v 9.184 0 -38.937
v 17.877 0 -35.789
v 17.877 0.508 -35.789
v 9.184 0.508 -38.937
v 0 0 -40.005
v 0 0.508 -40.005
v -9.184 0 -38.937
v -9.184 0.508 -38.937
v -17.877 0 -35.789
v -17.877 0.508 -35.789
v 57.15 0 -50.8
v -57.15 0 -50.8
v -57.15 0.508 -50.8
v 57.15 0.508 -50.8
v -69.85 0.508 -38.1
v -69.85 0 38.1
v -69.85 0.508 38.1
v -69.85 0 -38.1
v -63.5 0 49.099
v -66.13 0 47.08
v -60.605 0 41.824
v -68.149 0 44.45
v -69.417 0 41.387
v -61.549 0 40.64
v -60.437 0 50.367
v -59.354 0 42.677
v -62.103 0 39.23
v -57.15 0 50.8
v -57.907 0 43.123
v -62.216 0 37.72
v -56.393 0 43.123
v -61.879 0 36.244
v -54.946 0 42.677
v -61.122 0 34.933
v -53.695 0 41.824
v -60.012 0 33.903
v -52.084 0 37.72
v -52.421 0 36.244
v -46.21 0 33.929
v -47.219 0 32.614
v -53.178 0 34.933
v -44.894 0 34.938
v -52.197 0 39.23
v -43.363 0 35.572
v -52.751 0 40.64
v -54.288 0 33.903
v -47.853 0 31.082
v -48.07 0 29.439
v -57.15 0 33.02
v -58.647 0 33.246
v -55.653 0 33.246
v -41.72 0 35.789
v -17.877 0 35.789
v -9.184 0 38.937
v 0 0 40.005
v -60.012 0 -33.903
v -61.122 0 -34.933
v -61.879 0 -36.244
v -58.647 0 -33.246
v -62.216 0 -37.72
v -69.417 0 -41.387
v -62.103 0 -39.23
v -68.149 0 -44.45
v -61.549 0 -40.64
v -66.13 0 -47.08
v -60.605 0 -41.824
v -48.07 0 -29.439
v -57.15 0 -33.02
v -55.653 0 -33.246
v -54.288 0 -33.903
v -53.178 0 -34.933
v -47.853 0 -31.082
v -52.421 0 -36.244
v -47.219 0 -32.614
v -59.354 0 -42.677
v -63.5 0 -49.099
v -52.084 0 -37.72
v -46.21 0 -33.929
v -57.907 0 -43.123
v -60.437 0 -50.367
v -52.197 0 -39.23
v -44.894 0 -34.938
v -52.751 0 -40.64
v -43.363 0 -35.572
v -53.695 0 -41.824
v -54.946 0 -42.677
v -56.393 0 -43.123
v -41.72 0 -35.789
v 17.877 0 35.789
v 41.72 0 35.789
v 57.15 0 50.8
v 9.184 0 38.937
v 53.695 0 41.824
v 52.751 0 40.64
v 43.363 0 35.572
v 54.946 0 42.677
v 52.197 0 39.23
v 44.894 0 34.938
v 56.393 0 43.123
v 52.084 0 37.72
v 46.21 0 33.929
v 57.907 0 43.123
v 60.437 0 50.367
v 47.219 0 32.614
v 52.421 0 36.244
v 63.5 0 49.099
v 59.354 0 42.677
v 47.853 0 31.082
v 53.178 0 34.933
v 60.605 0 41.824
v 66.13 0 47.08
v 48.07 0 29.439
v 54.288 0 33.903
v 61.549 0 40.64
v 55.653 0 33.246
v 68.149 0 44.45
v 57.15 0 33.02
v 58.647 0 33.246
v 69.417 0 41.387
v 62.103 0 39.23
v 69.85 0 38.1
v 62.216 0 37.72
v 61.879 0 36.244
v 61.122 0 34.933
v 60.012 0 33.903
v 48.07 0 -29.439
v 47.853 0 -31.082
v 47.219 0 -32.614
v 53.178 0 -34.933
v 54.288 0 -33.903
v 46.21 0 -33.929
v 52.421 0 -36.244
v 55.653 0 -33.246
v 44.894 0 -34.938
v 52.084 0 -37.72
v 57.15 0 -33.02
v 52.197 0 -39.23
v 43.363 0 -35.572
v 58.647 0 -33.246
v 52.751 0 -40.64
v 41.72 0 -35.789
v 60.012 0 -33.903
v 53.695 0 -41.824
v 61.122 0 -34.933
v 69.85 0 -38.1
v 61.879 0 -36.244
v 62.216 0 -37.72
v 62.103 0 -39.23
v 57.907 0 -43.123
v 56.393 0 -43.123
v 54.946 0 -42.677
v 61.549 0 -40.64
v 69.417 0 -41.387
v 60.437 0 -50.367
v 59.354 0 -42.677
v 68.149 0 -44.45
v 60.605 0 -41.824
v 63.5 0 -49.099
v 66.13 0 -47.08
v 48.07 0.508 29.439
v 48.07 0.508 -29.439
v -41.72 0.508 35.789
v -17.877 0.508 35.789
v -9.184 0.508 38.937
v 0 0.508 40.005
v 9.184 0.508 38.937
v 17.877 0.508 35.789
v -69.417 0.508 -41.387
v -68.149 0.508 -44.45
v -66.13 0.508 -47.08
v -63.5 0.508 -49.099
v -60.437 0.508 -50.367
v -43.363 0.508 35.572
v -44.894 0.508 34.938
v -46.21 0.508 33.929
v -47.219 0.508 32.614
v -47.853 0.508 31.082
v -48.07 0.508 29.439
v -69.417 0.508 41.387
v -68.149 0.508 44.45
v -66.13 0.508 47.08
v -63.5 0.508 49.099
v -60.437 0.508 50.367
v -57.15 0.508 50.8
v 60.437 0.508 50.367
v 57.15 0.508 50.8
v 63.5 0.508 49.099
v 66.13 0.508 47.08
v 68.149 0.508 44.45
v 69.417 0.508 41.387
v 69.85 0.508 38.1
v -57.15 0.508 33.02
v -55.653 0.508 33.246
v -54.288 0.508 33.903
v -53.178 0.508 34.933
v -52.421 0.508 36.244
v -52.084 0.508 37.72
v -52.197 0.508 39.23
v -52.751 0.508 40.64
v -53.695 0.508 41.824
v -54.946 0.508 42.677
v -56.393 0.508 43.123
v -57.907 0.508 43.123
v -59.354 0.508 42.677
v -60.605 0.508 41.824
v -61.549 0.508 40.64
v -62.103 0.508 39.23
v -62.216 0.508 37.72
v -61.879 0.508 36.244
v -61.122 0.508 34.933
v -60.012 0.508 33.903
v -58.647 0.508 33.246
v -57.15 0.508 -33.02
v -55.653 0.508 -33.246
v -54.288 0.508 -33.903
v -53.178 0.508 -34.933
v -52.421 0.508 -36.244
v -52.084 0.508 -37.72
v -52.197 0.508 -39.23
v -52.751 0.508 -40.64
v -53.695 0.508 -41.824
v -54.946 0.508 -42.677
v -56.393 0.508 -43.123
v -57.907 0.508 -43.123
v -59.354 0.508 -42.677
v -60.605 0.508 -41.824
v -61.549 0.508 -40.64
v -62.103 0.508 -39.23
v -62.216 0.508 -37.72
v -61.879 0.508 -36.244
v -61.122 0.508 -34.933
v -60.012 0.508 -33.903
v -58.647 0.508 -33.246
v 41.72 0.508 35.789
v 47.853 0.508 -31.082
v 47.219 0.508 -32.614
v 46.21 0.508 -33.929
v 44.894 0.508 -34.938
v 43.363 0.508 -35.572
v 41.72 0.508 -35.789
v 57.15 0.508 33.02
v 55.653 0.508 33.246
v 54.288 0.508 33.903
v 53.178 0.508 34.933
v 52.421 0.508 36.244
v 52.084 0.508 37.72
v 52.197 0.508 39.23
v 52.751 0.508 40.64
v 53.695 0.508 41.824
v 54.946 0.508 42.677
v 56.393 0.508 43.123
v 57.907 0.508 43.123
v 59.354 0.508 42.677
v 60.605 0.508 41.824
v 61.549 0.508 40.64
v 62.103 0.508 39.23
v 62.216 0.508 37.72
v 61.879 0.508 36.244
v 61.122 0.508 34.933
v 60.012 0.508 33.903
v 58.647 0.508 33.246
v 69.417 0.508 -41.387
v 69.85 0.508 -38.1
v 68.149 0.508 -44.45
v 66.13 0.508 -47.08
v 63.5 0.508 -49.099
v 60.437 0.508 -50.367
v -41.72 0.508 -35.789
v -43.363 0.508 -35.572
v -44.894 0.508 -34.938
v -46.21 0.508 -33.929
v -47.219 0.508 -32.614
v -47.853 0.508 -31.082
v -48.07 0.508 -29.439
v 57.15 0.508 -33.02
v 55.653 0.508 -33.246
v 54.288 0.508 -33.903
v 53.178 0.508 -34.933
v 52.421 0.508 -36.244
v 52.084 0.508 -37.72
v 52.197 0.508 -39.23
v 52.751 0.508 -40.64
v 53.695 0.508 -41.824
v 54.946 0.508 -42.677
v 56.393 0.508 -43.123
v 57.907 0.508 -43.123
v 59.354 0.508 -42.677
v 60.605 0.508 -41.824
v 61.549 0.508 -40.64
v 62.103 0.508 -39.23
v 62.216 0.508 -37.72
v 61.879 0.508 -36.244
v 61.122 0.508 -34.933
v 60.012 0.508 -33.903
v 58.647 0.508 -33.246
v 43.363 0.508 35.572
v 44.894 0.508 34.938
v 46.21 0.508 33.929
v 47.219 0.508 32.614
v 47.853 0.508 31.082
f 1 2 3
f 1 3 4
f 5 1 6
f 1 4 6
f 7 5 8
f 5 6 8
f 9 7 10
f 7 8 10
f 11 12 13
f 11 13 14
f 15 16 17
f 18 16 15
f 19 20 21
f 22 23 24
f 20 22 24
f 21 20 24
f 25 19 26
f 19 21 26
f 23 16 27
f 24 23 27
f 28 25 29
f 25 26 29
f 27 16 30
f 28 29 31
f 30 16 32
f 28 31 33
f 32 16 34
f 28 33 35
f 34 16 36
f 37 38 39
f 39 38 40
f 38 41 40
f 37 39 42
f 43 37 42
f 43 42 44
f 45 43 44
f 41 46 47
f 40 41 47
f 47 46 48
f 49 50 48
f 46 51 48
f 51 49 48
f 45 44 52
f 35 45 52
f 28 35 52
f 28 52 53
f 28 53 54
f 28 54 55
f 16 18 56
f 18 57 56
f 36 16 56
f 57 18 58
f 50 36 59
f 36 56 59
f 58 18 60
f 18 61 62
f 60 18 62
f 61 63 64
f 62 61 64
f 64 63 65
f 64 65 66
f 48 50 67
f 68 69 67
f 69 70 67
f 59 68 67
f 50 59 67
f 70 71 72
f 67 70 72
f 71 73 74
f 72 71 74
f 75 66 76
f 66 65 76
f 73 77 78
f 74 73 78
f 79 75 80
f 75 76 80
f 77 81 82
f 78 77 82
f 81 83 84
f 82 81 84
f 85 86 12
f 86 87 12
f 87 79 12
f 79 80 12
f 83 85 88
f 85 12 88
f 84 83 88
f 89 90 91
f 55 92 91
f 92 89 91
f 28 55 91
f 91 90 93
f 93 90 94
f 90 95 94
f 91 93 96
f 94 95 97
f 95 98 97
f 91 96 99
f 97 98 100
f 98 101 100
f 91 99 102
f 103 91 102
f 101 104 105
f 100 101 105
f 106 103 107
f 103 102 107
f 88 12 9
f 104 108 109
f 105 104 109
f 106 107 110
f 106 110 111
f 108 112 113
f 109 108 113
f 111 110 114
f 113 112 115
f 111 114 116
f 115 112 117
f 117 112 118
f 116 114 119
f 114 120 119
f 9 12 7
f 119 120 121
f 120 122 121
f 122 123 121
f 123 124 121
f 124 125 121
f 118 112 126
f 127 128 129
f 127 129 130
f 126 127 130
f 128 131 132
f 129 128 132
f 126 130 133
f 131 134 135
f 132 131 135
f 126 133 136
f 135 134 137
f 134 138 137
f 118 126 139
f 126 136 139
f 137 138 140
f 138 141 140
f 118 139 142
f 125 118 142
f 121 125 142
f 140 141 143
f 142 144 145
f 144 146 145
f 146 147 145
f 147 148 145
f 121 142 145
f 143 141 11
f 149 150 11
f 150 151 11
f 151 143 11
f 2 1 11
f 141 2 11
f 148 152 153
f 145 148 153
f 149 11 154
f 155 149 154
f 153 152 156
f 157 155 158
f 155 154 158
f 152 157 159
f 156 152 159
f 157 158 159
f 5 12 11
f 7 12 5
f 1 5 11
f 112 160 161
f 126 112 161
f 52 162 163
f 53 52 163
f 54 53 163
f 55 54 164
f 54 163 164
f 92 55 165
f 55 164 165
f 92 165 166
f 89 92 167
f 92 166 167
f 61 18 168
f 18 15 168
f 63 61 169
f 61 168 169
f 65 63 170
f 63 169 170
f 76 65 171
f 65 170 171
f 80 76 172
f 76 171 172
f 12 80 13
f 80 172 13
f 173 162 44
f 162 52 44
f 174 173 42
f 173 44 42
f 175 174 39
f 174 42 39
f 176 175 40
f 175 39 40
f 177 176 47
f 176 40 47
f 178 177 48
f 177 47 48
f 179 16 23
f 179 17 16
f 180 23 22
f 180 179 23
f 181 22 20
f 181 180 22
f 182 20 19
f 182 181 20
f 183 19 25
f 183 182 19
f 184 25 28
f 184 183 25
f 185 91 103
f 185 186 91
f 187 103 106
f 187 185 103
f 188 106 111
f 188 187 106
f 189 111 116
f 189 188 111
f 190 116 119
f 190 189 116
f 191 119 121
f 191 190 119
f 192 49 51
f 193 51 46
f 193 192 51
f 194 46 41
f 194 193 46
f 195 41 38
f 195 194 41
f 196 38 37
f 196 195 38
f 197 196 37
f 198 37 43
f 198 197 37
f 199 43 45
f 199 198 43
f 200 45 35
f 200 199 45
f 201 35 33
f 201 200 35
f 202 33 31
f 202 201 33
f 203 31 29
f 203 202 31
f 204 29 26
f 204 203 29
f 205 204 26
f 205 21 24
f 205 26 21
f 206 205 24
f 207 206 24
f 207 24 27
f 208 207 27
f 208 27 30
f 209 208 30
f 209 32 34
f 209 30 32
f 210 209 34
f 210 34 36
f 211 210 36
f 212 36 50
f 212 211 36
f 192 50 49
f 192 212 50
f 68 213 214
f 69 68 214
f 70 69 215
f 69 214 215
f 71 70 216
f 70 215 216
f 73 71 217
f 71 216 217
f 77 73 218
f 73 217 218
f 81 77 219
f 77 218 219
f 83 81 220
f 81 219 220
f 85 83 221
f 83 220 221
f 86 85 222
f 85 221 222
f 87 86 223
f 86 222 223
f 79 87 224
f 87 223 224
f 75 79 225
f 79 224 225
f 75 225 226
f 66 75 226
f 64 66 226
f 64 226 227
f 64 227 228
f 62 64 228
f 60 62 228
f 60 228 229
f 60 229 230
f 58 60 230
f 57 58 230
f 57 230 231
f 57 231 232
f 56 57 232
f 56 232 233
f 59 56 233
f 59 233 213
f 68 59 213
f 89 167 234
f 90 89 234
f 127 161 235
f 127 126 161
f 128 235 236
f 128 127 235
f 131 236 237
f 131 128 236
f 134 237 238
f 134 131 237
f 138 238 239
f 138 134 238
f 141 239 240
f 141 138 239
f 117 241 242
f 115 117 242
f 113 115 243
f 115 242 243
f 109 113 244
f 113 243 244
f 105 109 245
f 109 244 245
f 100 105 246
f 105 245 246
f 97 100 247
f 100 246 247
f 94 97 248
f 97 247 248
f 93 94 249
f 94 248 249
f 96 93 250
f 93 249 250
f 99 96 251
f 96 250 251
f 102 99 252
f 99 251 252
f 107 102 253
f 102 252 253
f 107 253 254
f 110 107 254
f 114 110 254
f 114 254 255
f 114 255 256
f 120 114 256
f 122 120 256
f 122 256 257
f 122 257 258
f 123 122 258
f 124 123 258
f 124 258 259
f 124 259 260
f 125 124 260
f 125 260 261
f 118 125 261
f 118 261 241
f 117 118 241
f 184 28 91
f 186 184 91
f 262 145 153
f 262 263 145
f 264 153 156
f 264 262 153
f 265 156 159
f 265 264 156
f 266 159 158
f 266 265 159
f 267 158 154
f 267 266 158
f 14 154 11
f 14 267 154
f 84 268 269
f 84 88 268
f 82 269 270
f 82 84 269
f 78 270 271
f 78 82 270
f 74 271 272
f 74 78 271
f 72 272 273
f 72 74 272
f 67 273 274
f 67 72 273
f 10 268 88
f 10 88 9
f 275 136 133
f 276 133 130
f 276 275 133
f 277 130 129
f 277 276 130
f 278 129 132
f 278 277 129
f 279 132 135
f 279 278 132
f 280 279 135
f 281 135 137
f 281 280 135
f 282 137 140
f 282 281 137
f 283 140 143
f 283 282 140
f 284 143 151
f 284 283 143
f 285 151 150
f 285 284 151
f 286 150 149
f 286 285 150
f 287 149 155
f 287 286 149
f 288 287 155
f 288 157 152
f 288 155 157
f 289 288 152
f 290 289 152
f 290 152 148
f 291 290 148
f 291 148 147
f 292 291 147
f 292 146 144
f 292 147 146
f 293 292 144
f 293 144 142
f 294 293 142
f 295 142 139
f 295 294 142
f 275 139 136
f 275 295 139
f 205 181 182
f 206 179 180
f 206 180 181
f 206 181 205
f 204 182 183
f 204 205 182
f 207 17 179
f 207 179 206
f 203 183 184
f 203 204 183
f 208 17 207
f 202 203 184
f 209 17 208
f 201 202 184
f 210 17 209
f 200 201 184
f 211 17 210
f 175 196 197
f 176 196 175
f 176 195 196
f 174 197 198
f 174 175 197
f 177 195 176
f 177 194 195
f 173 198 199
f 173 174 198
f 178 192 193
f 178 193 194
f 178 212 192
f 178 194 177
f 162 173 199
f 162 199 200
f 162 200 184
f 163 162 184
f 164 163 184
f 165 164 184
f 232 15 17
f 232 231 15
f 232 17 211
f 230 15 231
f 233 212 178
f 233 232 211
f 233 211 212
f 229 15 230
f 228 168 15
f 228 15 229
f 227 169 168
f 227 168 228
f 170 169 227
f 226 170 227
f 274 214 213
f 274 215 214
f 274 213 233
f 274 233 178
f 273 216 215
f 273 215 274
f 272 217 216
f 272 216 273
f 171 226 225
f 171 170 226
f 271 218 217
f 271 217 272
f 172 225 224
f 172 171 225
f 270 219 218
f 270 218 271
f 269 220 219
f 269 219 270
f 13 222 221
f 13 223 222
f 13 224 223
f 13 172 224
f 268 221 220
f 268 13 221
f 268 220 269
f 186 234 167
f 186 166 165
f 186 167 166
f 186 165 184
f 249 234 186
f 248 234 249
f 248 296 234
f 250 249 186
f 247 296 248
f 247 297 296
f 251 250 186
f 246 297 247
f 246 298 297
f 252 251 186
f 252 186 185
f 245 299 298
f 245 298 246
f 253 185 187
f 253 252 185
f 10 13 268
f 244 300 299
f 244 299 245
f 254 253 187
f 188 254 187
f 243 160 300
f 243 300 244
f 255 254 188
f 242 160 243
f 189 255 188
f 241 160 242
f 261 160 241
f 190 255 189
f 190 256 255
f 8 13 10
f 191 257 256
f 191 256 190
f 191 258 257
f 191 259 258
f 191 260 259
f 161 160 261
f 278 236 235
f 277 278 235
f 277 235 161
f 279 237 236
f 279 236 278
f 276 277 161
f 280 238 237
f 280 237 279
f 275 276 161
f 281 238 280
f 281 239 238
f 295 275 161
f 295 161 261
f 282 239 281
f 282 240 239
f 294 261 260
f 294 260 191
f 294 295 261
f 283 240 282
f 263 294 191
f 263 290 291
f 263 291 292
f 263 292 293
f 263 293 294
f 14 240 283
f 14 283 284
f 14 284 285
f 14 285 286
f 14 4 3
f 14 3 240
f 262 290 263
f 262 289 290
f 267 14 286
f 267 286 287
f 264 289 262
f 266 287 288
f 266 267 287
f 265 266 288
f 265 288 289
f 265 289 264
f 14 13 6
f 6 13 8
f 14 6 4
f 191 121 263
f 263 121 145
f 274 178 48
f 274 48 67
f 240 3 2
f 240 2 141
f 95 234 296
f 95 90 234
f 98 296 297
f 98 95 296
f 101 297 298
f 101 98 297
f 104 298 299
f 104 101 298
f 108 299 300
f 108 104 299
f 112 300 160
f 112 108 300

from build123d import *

# Parameters (mm, degrees)
SKETCH1_W               = 139.7
SKETCH1_H               = 101.6
BOSS_EXTRUDE1_DEPTH     = 0.508
FILLET1_R               = 12.7
SKETCH2_W               = 96.139
SKETCH2_H               = 71.5772
CUT_EXTRUDE1_DEPTH      = 87.370831674
FILLET2_R               = 6.35
SKETCH3_R               = 5.08
CUT_EXTRUDE2_DEPTH      = 87.370831674
MIRROR2_COPY_1_SKETCH_R = 5.08
MIRROR2_COPY_1_DEPTH    = 87.370831674
SKETCH4_R               = 40.005
CUT_EXTRUDE3_DEPTH      = 87.370831674


with BuildPart() as part:
    # Sketch1 → Boss-Extrude1 (new body)
    with BuildSketch(Plane(origin=(0, 0, 0), x_dir=(1, 0, 0), z_dir=(0, 1, 0))):
        Rectangle(SKETCH1_W, SKETCH1_H)
    extrude(amount=BOSS_EXTRUDE1_DEPTH)

    # Fillet1
    fillet1_edges = [part.edges().sort_by_distance(p)[0] for p in [
        (-69.85, 0.254, -50.8),
        (69.85, 0.254, -50.8),
        (69.85, 0.254, 50.8),
        (-69.85, 0.254, 50.8),
    ]]
    fillet(fillet1_edges, radius=FILLET1_R)

    # Sketch2 → Cut-Extrude1 (cut, through all)
    with BuildSketch(Plane(origin=(0, 0.508, 0), x_dir=(1, 0, 0), z_dir=(0, 1, 0))):
        Rectangle(SKETCH2_W, SKETCH2_H)
    extrude(amount=-CUT_EXTRUDE1_DEPTH, mode=Mode.SUBTRACT)

    # Fillet2
    fillet2_edges = [part.edges().sort_by_distance(p)[0] for p in [
        (-48.0695, 0.254, 35.7886),
        (-48.0695, 0.254, -35.7886),
        (48.0695, 0.254, -35.7886),
        (48.0695, 0.254, 35.7886),
    ]]
    fillet(fillet2_edges, radius=FILLET2_R)

    # Sketch3 → Cut-Extrude2 (cut, through all)
    with BuildSketch(Plane(origin=(0, 0.508, 0), x_dir=(1, 0, 0), z_dir=(0, 1, 0))):
        with Locations(Location((-57.15, 38.1, 0), (0, 0, 270))):
            Circle(SKETCH3_R)
    cut_extrude2 = extrude(amount=-CUT_EXTRUDE2_DEPTH, mode=Mode.SUBTRACT)

    # Mirror1: Cut-Extrude2 across plane
    add(cut_extrude2.mirror(Plane(origin=(0, 0, 0), x_dir=(0, 0, 1), z_dir=(1, 0, 0))), mode=Mode.SUBTRACT)

    # Mirror2: Cut-Extrude2 across plane
    add(cut_extrude2.mirror(Plane.XY), mode=Mode.SUBTRACT)

    # Mirror2 copy 1 sketch → Mirror2 copy 1 (cut, through all)
    with BuildSketch(Plane(origin=(0, 0.508, 0), x_dir=(-1, 0, 0), z_dir=(0, 1, 0))):
        with Locations(Location((-57.15, 38.1, 0), (0, 0, 270))):
            Circle(MIRROR2_COPY_1_SKETCH_R)
    extrude(amount=-MIRROR2_COPY_1_DEPTH, mode=Mode.SUBTRACT)

    # Sketch4 → Cut-Extrude3 (cut, through all)
    with BuildSketch(Plane(origin=(0, 0.508, 0), x_dir=(1, 0, 0), z_dir=(0, 1, 0))):
        Circle(SKETCH4_R)
    extrude(amount=-CUT_EXTRUDE3_DEPTH, mode=Mode.SUBTRACT)


solid = part.part
